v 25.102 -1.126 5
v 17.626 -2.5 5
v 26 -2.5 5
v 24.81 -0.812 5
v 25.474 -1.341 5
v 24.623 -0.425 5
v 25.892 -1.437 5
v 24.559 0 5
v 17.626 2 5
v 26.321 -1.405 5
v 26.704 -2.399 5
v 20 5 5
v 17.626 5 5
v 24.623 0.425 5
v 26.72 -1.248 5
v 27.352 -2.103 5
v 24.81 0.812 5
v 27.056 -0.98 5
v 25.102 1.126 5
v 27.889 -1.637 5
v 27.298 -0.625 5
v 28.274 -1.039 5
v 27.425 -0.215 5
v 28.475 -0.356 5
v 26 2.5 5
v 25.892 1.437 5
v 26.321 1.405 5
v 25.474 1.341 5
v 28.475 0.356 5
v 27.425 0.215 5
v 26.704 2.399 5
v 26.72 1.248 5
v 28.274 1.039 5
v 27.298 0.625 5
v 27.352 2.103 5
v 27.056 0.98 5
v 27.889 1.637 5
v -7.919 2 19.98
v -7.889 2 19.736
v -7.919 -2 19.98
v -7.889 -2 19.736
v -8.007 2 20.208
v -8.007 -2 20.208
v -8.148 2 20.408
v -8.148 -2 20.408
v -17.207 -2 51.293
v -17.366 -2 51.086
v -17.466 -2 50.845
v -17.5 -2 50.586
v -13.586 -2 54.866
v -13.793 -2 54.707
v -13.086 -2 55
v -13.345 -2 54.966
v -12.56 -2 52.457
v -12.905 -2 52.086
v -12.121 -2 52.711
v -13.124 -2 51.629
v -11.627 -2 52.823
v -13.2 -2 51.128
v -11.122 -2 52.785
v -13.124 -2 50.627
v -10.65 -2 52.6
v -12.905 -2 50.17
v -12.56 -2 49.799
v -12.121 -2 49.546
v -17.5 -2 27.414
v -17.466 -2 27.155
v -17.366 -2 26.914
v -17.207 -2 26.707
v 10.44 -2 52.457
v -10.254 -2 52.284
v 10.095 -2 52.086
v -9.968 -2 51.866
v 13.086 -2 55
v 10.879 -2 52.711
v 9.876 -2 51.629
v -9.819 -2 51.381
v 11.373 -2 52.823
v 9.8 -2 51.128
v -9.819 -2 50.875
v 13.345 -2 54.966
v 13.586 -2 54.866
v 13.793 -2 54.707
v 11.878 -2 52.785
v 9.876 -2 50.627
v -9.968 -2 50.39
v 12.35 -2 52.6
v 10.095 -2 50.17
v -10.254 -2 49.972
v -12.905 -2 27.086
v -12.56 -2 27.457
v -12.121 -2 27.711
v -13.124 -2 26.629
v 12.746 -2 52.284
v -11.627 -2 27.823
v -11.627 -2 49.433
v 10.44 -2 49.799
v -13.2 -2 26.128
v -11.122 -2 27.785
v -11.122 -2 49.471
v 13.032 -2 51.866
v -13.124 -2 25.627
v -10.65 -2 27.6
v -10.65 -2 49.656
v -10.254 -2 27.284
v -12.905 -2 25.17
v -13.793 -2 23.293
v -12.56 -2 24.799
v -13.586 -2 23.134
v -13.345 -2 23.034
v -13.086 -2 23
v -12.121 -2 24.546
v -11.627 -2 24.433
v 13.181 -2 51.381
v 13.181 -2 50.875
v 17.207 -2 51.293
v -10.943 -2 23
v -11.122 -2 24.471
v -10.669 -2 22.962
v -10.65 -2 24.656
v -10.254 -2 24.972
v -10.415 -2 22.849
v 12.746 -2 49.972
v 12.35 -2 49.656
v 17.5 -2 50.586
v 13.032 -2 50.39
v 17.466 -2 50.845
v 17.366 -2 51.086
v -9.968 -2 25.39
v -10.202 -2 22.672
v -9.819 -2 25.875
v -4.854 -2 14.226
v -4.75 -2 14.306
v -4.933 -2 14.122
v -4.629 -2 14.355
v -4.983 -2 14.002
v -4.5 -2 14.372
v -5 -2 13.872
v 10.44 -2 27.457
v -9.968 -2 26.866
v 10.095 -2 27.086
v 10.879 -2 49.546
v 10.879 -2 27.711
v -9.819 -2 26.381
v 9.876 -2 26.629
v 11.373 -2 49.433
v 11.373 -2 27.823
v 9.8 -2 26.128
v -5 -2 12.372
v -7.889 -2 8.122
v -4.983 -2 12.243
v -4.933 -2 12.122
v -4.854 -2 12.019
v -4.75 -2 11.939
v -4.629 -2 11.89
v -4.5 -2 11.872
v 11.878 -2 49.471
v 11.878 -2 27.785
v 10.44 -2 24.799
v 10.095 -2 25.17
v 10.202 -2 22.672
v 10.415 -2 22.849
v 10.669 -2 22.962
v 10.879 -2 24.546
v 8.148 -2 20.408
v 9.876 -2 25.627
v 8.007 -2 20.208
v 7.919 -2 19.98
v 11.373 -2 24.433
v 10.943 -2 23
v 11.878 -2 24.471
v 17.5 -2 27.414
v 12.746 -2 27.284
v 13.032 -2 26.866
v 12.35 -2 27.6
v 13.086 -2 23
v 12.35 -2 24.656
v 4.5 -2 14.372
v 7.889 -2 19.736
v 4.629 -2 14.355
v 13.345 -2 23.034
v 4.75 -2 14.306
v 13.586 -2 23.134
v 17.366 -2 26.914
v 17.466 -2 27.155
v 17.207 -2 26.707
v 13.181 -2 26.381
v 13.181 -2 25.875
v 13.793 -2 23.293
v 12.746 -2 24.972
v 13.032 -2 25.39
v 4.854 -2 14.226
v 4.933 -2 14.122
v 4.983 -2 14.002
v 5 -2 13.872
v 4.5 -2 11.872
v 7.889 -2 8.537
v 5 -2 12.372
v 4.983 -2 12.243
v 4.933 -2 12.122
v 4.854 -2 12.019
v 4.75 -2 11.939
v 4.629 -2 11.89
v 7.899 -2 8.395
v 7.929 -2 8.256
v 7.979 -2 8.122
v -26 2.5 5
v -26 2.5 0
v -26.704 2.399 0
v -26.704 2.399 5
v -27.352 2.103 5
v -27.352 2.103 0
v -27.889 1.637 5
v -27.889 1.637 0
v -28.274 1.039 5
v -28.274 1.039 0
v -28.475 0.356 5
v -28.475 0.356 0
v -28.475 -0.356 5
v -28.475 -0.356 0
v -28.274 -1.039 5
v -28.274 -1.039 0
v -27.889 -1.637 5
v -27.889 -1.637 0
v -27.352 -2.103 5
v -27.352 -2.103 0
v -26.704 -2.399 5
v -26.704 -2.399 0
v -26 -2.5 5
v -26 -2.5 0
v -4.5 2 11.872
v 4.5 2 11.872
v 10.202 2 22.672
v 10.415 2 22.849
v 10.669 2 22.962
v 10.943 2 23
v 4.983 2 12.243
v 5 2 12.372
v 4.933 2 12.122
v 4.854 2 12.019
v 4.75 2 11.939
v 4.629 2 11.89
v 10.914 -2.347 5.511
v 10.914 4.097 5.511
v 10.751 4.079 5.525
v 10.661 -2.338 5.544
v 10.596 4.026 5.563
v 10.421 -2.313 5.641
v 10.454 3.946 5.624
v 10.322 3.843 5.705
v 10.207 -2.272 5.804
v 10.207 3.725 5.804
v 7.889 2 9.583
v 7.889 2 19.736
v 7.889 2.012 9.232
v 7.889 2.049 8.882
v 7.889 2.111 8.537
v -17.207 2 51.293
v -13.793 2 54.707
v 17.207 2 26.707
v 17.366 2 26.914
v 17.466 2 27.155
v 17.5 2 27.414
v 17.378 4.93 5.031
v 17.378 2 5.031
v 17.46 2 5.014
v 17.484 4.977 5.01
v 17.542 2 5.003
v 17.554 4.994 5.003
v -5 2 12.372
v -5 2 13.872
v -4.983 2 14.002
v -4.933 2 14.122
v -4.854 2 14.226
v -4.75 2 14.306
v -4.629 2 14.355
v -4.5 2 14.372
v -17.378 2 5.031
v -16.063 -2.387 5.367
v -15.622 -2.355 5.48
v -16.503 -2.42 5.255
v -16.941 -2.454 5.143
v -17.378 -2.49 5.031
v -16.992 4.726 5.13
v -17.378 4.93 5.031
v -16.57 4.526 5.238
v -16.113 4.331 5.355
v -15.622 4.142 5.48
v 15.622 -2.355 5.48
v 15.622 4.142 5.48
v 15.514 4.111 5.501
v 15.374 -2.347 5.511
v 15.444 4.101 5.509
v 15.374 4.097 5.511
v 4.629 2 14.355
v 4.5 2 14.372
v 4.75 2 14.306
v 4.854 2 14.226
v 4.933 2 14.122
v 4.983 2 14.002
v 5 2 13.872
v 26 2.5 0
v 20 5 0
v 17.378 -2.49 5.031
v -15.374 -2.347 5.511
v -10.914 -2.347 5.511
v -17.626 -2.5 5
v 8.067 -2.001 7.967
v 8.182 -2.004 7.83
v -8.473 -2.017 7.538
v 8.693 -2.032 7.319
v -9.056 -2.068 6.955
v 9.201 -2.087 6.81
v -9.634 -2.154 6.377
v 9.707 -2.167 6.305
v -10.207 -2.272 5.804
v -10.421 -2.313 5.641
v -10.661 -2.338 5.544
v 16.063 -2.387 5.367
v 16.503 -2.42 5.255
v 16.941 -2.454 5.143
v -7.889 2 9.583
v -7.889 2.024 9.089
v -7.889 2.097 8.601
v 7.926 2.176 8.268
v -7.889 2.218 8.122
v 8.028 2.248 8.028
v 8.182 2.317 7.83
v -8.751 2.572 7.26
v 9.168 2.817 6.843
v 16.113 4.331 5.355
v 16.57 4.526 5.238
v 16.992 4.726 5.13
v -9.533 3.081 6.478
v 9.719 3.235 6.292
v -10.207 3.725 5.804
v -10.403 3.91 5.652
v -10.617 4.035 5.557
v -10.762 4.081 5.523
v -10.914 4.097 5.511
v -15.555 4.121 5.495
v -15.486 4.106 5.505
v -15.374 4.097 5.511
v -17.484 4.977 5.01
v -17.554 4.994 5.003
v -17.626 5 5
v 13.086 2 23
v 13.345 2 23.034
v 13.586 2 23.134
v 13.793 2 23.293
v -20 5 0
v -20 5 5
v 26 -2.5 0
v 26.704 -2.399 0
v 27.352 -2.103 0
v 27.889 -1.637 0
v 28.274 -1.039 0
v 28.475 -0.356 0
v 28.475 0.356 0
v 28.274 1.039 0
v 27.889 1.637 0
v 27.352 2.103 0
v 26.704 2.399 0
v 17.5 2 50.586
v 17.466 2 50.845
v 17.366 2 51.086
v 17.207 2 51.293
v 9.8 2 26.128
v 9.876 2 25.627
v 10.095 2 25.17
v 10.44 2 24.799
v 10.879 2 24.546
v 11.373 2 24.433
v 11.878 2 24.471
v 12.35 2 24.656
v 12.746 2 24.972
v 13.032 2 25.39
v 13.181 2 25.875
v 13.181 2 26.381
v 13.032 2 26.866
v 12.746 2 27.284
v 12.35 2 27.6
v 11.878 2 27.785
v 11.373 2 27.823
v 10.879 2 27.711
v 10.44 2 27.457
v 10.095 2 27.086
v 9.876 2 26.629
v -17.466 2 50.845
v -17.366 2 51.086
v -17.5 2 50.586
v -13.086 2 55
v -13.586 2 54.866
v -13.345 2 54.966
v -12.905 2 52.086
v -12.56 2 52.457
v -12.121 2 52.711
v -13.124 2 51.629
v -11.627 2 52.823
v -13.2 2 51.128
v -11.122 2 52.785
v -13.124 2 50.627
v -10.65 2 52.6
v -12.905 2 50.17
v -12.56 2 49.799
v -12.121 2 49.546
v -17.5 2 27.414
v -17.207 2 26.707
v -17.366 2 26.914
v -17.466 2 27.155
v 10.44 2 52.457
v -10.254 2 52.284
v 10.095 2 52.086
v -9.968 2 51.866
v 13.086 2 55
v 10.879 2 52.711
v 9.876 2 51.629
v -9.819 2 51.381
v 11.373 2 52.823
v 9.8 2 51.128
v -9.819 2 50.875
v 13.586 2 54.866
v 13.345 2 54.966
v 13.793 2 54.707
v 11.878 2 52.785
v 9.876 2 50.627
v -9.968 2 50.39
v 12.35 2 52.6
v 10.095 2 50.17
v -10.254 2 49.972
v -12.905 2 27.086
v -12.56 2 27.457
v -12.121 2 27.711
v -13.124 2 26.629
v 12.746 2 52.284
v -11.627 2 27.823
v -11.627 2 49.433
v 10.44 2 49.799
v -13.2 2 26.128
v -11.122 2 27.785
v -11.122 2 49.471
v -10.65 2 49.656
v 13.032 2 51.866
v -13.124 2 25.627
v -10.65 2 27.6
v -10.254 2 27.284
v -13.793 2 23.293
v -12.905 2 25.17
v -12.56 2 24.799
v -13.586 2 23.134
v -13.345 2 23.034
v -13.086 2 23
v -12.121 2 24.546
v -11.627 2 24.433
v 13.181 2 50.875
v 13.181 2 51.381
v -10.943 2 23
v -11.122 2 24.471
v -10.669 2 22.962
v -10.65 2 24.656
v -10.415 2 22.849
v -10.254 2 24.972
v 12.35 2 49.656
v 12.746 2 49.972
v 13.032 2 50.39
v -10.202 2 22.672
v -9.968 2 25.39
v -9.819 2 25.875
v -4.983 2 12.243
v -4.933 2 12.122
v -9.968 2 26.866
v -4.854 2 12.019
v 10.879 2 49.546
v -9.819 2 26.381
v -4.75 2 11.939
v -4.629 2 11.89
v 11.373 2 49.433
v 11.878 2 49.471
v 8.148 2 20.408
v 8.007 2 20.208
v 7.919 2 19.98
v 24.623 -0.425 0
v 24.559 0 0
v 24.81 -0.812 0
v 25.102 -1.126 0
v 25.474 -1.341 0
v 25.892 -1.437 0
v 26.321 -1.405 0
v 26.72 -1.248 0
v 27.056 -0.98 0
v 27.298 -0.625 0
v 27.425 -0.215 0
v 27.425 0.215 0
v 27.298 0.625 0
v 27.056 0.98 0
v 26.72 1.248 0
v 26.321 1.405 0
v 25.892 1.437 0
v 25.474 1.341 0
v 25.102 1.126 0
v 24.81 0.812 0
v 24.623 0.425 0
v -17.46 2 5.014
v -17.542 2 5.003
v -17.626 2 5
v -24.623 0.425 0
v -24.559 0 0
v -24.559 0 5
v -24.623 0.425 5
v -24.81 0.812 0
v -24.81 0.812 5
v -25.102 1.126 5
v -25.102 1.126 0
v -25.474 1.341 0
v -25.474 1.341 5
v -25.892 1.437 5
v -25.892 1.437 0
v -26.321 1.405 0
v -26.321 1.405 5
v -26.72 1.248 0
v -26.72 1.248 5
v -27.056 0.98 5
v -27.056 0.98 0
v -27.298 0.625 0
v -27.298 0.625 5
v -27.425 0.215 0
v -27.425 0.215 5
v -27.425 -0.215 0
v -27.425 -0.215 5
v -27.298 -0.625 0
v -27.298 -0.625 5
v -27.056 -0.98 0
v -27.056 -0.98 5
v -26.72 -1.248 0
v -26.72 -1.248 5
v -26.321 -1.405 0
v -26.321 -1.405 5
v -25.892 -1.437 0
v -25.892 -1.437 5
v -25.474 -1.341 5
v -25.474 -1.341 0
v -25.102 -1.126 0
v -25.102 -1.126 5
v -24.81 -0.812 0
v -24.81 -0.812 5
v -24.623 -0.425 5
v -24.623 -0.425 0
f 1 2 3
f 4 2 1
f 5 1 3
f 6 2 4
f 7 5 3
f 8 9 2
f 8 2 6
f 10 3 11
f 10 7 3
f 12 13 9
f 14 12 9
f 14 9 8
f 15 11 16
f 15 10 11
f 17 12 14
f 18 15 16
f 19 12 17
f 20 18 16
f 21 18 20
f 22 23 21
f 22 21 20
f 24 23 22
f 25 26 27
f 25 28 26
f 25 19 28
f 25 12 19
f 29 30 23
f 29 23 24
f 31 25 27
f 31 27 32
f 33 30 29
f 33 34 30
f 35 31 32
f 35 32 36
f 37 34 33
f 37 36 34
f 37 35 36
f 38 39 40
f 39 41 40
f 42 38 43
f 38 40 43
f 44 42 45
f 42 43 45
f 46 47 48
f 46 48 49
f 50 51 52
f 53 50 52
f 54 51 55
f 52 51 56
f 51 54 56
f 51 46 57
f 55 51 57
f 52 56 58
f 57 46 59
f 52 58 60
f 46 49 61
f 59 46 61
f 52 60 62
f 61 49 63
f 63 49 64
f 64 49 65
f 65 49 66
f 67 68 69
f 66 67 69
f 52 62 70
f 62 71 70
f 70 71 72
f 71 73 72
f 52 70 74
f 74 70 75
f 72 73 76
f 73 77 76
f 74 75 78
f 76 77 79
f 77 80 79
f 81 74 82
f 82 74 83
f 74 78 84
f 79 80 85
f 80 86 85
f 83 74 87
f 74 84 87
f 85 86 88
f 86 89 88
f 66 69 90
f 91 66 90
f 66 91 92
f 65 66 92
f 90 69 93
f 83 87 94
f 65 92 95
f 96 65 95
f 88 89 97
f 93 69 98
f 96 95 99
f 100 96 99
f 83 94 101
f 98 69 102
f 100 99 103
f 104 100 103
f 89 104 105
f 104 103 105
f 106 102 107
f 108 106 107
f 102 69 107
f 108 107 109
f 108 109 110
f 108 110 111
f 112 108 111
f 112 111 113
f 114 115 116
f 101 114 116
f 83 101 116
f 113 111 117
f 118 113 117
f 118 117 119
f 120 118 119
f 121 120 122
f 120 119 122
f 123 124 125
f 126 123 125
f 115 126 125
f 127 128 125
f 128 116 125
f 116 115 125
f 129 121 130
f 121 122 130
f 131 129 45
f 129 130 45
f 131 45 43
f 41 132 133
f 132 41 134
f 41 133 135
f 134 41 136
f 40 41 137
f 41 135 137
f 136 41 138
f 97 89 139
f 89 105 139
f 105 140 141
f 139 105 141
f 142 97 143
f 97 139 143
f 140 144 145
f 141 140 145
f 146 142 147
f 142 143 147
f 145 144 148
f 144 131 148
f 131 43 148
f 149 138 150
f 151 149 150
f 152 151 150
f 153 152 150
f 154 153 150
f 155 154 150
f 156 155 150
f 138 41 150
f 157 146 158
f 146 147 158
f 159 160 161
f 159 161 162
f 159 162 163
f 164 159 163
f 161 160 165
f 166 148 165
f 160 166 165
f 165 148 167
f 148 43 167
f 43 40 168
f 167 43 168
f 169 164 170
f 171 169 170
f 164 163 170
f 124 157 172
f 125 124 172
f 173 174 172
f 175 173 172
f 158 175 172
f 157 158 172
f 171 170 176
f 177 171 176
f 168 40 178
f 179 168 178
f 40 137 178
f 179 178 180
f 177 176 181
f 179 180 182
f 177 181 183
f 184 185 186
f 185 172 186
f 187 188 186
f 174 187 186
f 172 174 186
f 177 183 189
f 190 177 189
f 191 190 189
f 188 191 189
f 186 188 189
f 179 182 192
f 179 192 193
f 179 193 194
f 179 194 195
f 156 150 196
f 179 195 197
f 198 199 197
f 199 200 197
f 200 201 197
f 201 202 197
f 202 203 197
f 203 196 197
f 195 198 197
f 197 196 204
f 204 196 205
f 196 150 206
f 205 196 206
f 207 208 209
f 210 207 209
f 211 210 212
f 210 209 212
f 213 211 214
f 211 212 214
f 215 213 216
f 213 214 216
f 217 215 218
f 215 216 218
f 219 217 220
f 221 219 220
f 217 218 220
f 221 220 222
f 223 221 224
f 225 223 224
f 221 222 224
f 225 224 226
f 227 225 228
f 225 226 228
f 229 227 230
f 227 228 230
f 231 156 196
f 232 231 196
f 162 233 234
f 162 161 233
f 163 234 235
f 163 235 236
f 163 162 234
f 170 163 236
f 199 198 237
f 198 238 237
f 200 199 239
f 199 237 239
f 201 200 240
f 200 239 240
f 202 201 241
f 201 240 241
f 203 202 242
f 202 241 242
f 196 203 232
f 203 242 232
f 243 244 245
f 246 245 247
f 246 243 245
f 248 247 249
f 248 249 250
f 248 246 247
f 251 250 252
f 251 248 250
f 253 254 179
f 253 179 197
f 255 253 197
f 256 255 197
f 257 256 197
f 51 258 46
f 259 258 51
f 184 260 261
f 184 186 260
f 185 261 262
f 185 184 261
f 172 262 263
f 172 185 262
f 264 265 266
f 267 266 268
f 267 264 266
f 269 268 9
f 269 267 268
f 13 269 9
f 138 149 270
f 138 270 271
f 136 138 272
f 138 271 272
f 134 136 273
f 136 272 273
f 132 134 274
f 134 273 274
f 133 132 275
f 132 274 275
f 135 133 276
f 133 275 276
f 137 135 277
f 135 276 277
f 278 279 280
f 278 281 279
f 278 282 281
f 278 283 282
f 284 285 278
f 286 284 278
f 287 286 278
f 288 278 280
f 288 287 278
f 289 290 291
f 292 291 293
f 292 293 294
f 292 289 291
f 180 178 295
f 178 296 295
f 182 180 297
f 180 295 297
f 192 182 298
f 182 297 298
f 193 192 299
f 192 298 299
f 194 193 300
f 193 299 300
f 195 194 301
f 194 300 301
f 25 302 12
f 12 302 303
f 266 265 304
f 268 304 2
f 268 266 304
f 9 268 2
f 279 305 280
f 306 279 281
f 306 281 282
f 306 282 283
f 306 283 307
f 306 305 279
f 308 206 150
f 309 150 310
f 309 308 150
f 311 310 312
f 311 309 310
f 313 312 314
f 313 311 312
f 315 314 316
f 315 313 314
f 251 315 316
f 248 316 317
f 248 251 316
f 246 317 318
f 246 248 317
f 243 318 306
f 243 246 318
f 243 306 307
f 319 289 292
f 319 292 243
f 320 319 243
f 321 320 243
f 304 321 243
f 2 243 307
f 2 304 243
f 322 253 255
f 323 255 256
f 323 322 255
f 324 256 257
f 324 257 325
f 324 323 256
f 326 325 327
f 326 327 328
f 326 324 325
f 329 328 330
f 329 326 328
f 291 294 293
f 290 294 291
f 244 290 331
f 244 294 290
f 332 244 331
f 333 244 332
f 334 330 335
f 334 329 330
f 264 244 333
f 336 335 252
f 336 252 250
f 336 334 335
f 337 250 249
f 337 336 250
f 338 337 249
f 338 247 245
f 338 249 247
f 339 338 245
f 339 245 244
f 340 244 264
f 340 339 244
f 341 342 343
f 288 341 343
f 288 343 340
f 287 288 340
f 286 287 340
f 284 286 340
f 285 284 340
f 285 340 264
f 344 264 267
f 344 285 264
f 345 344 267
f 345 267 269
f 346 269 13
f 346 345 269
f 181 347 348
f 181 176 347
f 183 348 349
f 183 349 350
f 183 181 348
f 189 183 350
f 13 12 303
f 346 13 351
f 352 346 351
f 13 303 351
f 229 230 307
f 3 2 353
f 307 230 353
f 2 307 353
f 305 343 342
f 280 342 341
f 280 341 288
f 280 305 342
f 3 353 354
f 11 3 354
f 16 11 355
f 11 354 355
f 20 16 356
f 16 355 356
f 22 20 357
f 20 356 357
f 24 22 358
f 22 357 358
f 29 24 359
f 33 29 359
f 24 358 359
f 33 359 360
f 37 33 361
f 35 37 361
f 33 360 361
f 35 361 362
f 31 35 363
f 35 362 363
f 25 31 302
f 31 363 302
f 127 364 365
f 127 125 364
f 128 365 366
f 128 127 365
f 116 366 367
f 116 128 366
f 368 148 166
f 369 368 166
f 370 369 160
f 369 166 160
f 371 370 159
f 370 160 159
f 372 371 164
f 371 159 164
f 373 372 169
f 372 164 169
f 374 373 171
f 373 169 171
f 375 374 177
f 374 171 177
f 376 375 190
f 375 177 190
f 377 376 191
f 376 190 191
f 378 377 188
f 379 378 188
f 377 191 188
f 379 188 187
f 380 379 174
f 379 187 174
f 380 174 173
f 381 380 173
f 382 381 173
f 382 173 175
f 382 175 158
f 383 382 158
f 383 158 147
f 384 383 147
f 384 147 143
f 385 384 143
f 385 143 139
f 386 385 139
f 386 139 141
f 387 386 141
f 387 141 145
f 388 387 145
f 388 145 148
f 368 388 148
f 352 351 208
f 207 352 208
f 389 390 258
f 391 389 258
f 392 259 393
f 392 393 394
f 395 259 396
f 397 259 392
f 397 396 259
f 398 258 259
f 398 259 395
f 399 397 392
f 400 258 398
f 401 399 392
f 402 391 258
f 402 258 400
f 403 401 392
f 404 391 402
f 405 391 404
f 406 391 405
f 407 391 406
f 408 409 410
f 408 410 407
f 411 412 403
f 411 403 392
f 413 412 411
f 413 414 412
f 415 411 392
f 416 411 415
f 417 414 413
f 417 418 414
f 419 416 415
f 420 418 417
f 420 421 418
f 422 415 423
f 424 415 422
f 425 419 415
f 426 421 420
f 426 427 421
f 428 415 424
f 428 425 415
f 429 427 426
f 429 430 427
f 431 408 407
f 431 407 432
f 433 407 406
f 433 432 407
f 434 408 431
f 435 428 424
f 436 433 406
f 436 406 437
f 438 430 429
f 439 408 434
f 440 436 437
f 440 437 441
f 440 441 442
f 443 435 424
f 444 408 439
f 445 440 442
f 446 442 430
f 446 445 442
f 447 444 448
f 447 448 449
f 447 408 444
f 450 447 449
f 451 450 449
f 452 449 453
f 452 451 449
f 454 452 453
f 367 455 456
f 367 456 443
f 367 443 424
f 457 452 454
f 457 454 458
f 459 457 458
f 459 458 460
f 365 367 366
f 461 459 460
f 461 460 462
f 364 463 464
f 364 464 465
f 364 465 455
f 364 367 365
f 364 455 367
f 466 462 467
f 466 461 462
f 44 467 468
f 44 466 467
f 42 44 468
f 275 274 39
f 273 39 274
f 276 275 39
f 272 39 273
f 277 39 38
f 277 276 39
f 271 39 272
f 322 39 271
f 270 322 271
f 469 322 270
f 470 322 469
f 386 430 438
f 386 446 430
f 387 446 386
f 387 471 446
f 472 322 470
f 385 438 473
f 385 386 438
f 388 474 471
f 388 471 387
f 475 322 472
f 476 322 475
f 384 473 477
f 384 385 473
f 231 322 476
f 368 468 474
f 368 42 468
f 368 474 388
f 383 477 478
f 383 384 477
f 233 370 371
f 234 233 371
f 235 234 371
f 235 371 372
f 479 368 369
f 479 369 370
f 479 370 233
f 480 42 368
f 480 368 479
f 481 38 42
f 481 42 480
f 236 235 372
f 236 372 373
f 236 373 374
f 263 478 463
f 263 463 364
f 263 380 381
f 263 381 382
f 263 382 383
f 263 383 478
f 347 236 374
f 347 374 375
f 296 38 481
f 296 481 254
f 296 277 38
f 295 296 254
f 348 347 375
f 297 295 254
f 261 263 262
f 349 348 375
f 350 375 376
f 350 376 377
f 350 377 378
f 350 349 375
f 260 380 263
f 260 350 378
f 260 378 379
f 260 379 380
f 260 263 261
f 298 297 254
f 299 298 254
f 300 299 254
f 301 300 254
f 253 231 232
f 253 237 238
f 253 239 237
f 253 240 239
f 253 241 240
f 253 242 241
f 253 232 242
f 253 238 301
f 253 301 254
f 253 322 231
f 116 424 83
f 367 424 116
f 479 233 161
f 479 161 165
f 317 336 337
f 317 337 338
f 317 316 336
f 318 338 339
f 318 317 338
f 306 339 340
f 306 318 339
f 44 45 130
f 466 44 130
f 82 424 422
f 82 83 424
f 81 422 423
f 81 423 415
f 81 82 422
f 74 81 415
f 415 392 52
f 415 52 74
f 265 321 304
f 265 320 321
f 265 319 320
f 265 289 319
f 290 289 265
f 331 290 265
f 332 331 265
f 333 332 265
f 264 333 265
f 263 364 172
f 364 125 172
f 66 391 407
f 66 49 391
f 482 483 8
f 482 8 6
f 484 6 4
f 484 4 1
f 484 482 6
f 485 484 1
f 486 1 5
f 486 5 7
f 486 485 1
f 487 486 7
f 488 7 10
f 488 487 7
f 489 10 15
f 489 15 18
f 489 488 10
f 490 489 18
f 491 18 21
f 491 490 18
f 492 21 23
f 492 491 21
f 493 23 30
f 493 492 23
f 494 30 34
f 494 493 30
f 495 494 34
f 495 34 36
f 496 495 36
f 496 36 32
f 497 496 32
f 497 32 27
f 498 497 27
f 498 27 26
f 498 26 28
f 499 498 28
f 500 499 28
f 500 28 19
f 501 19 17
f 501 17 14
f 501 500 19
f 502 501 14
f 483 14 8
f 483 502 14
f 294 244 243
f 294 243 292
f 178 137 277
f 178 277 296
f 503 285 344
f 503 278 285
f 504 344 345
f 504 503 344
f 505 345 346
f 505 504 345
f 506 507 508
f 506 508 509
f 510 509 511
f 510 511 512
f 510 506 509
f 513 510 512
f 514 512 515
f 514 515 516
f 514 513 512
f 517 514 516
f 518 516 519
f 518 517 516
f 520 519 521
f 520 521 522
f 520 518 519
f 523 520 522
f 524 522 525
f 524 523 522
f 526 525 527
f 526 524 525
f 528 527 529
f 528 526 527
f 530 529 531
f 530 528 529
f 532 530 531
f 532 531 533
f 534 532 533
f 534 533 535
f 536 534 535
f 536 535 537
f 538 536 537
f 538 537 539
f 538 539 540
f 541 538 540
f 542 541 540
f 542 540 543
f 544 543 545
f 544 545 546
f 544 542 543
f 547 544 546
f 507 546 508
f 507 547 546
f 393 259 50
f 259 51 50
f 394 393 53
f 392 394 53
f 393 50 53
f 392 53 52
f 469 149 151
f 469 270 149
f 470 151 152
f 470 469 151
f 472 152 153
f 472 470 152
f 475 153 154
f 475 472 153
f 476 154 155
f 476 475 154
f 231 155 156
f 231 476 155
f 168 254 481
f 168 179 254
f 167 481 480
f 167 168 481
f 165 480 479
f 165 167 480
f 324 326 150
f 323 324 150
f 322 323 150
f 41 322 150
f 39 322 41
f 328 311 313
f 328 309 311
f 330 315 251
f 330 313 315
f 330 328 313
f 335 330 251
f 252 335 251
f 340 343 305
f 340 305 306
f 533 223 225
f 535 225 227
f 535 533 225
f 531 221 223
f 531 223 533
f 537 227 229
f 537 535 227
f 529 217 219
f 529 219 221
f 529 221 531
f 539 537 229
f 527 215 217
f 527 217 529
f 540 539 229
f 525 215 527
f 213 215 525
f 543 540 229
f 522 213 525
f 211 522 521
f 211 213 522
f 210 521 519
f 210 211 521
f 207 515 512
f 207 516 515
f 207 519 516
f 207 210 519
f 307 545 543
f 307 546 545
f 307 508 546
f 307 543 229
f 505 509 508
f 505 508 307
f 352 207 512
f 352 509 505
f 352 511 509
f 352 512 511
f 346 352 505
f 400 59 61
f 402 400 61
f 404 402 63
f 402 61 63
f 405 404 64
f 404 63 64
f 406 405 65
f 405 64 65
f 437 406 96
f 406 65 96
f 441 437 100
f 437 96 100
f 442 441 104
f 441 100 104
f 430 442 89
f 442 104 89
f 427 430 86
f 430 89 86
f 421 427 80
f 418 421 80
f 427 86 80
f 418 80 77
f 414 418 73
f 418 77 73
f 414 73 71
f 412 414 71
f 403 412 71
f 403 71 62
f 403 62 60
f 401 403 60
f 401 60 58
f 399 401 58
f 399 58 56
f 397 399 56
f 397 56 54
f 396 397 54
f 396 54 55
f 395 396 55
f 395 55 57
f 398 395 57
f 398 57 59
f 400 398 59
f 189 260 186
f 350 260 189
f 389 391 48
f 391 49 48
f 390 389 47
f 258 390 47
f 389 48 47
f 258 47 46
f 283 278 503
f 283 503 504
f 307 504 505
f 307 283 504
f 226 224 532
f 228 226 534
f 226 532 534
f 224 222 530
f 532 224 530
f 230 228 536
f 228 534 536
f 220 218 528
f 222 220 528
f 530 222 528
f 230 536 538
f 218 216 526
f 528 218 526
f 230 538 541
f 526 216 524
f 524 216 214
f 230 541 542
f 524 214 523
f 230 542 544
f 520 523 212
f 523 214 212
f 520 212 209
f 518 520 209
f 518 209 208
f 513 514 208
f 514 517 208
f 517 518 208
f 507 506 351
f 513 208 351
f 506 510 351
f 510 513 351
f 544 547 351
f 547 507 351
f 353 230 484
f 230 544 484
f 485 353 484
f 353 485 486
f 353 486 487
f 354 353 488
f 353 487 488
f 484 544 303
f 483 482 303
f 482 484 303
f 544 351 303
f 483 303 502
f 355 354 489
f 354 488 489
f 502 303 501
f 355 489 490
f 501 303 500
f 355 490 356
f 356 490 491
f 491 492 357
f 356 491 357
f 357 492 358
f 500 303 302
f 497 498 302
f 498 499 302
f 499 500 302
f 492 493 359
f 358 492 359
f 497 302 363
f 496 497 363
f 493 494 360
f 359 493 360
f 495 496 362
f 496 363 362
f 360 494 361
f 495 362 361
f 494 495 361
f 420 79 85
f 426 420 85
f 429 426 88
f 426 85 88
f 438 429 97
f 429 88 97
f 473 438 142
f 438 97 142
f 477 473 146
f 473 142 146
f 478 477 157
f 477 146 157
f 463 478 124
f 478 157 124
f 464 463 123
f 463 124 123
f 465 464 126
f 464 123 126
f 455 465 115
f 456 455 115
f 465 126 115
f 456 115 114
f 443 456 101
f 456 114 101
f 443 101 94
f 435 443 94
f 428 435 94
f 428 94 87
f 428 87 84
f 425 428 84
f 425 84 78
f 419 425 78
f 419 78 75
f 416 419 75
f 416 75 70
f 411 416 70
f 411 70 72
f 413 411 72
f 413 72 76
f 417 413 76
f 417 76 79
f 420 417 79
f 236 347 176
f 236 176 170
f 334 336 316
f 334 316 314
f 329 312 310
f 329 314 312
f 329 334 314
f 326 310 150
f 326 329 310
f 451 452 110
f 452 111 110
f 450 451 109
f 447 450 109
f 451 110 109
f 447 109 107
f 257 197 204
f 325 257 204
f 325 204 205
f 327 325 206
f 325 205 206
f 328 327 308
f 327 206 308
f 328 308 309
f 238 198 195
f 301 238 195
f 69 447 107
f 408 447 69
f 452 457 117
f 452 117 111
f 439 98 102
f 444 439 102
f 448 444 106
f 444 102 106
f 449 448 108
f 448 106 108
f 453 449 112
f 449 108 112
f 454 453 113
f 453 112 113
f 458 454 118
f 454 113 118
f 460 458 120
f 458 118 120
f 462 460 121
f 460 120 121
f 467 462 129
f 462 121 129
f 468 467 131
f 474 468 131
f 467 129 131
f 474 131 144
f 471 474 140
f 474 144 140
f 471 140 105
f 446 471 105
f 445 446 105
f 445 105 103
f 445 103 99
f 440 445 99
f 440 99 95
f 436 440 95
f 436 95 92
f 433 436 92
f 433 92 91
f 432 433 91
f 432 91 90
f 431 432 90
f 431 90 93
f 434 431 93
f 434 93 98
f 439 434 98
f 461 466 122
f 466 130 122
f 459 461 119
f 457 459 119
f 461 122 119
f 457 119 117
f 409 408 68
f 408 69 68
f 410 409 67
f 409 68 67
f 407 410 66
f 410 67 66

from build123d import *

# Parameters (mm, degrees)
SKETCH_1_R                      = 1.440775231
EXTRUDE_1_DEPTH                 = 5
SKETCH_3_W                      = 35
SKETCH_3_H                      = 4
EXTRUDE_2_DEPTH                 = 50
FILLET_1_R                      = 10
FILLET_2_R                      = 5
CUT_EXTRUDE_2_DEPTH             = 63.339794674
CUT_EXTRUDE_2_DEPTH_BACK        = 63.339794674
CUT_EXTRUDE_3_REACH             = 64.34
SKETCH_5_R                      = 1.7
SKETCH_5_W                      = 10
SKETCH_5_H                      = 2.5
CUT_EXTRUDE_3_DIRECTION_2_DEPTH = 63.339794674
FILLET_3_R                      = 0.5
FILLET_4_R                      = 1


with BuildPart() as part:
    # 草图1 → 凸台-拉伸1 (new body)
    with BuildSketch(Plane.XY):
        with BuildLine():
            Line((-26, -2.5), (26, -2.5))
            ThreePointArc((26, -2.5), (28.5, 0), (26, 2.5))
            Line((26, 2.5), (20, 5))
            Line((20, 5), (-20, 5))
            Line((-20, 5), (-26, 2.5))
            ThreePointArc((-26, 2.5), (-28.5, 0), (-26, -2.5))
        make_face()
        with Locations((-26, 0)):
            Circle(SKETCH_1_R, mode=Mode.SUBTRACT)
        with Locations(Location((26, 0, 0), (0, 0, 180))):
            Circle(SKETCH_1_R, mode=Mode.SUBTRACT)
    extrude(amount=EXTRUDE_1_DEPTH)

    # 草图3 → 凸台-拉伸2 (add)
    with BuildSketch(Plane.XY.offset(5)):
        Rectangle(SKETCH_3_W, SKETCH_3_H)
    extrude(amount=EXTRUDE_2_DEPTH)

    # 圆角1
    # the kernel refuses this fillet: 10 mm, written as the material it adds along each edge
    with BuildSketch(Plane(origin=(17.5, -2, 5), x_dir=(0, -1.0, 2.1849189124477904e-12), z_dir=(-1, 0, 0))) as fillet_1_piece_1:
        with BuildLine():
            CenterArc((10, 3.122498999), FILLET_1_R, 180, 18.194872339)
            Line((0, 3.122498999), (-0.2, 3.122498999))
            Line((-0.2, 3.122498999), (-0.2, 0))
            Line((-0.2, 0), (0, -0.2))
            ThreePointArc((0, -0.2), (0.25, -0.2), (0.31, -0.06244998))
            Line((0.31, -0.06244998), (0.5, 0))
        make_face()
    extrude(amount=35)

    # 圆角2
    # the kernel refuses this fillet: 5 mm, written as the material it adds along each edge
    with BuildSketch(Plane(origin=(-17.5, 2, 5), x_dir=(0, 0, 1), z_dir=(1, 0, 0))) as fillet_2_piece_1:
        with BuildLine():
            CenterArc((4.582575695, -5), FILLET_2_R, 90, 66.421821522)
            Line((0, -3), (-0.091651514, -2.96))
            ThreePointArc((-0.091651514, -2.96), (-0.1, -1.5), (-0.1, 0))
            Line((-0.1, 0), (0, 0.1))
            Line((0, 0.1), (4.582575695, 0.1))
            Line((4.582575695, 0.1), (4.582575695, 0))
        make_face()
    extrude(amount=35)

    # 草图4 → 切除-拉伸2 (cut, two sides: drawn at the far end of the back side and taken through both)
    with BuildSketch(Plane.XZ.offset(2).offset(-CUT_EXTRUDE_2_DEPTH_BACK)):
        Polygon((-17.5, 51), (-13.5, 55), (-17.5, 55), align=None)
        Polygon((-13.5, 23), (-17.5, 27), (-17.5, 5), (-15.5, 5.511275368), (-10.5, 5.511275368), (-7.888776369, 8.122498999), (-7.888776369, 20.122498999), (-10.5, 23), align=None)
        Polygon((17.5, 5), (17.5, 27), (13.5, 23), (10.5, 23), (7.888776369, 20.122498999), (7.888776369, 8.122498999), (10.5, 5.511275368), (15.5, 5.511275368), align=None)
        Polygon((17.5, 51), (17.5, 55), (13.5, 55), align=None)
    extrude(amount=CUT_EXTRUDE_2_DEPTH + CUT_EXTRUDE_2_DEPTH_BACK, mode=Mode.SUBTRACT)

    # 草图5 → 切除-拉伸3 (cut, up to next)
    with BuildSketch(Plane.XZ.offset(2), mode=Mode.PRIVATE) as cut_extrude_3_sk1:
        with Locations(Location((-11.5, 26.128065597, 0), (0, 0, 180))):
            Circle(SKETCH_5_R)
    cut_extrude_3_tool1 = extrude(cut_extrude_3_sk1.sketch, amount=-CUT_EXTRUDE_3_REACH, mode=Mode.PRIVATE) & part.part
    # 草图5 → 切除-拉伸3 (cut, up to next)
    with BuildSketch(Plane.XZ.offset(2), mode=Mode.PRIVATE) as cut_extrude_3_sk2:
        with Locations(Location((11.5, 26.128065597, 0), (0, 0, 180))):
            Circle(SKETCH_5_R)
    cut_extrude_3_tool2 = extrude(cut_extrude_3_sk2.sketch, amount=-CUT_EXTRUDE_3_REACH, mode=Mode.PRIVATE) & part.part
    # 草图5 → 切除-拉伸3 (cut, up to next)
    with BuildSketch(Plane.XZ.offset(2), mode=Mode.PRIVATE) as cut_extrude_3_sk3:
        with Locations(Location((11.5, 51.128065597, 0), (0, 0, 180))):
            Circle(SKETCH_5_R)
    cut_extrude_3_tool3 = extrude(cut_extrude_3_sk3.sketch, amount=-CUT_EXTRUDE_3_REACH, mode=Mode.PRIVATE) & part.part
    # 草图5 → 切除-拉伸3 (cut, up to next)
    with BuildSketch(Plane.XZ.offset(2), mode=Mode.PRIVATE) as cut_extrude_3_sk4:
        with Locations(Location((-11.5, 51.128065597, 0), (0, 0, 180))):
            Circle(SKETCH_5_R)
    cut_extrude_3_tool4 = extrude(cut_extrude_3_sk4.sketch, amount=-CUT_EXTRUDE_3_REACH, mode=Mode.PRIVATE) & part.part
    # 草图5 → 切除-拉伸3 (cut, up to next)
    with BuildSketch(Plane.XZ.offset(2), mode=Mode.PRIVATE) as cut_extrude_3_sk5:
        with Locations((0, 13.122498999)):
            Rectangle(SKETCH_5_W, SKETCH_5_H)
    cut_extrude_3_tool5 = extrude(cut_extrude_3_sk5.sketch, amount=-CUT_EXTRUDE_3_REACH, mode=Mode.PRIVATE) & part.part
    add(cut_extrude_3_tool1.solids().sort_by_distance((-11.5, -2, 26.128066))[0], mode=Mode.SUBTRACT)
    add(cut_extrude_3_tool2.solids().sort_by_distance((11.5, -2, 26.128066))[0], mode=Mode.SUBTRACT)
    add(cut_extrude_3_tool3.solids().sort_by_distance((11.5, -2, 51.128066))[0], mode=Mode.SUBTRACT)
    add(cut_extrude_3_tool4.solids().sort_by_distance((-11.5, -2, 51.128066))[0], mode=Mode.SUBTRACT)
    add(cut_extrude_3_tool5.solids().sort_by_distance((0, -2, 13.122499))[0], mode=Mode.SUBTRACT)

    # 草图5 → 切除-拉伸3 direction 2 (cut)
    with BuildSketch(Plane.XZ.offset(2)):
        with Locations(Location((-11.5, 26.128065597, 0), (0, 0, 180))):
            Circle(SKETCH_5_R)
        with Locations(Location((11.5, 26.128065597, 0), (0, 0, 180))):
            Circle(SKETCH_5_R)
        with Locations(Location((11.5, 51.128065597, 0), (0, 0, 180))):
            Circle(SKETCH_5_R)
        with Locations(Location((-11.5, 51.128065597, 0), (0, 0, 180))):
            Circle(SKETCH_5_R)
        with Locations((0, 13.122498999)):
            Rectangle(SKETCH_5_W, SKETCH_5_H)
    extrude(amount=CUT_EXTRUDE_3_DIRECTION_2_DEPTH, mode=Mode.SUBTRACT)

    # 圆角3
    fillet_3_edges = [part.edges().sort_by_distance(p)[0] for p in [
        (5, 0, 11.872498999),
        (5, 0, 14.372498999),
        (-5, 0, 14.372498999),
        (-5, 0, 11.872498999),
    ]]
    fillet(fillet_3_edges, radius=FILLET_3_R)

    # 圆角4
    fillet_4_edges = [part.edges().sort_by_distance(p)[0] for p in [
        (17.5, 0, 51),
        (13.5, 0, 55),
        (17.5, 0, 27),
        (13.5, 0, 23),
        (10.5, 0, 23),
        (7.888776369, 0, 20.122498999),
        (7.888776369, 0.108965912, 8.122498999),
        (10.5, 0.875277907, 5.511275368),
        (15.5, 0.875277907, 5.511275368),
        (17.5, 1.25, 5),
        (-17.5, 1.25, 5),
        (-15.5, 0.875277907, 5.511275368),
        (-10.5, 0.875277907, 5.511275368),
        (-7.888776369, 0, 20.122498999),
        (-10.5, 0, 23),
        (-13.5, 0, 23),
        (-17.5, 0, 27),
        (-17.5, 0, 51),
        (-13.5, 0, 55),
    ]]
    fillet(fillet_4_edges, radius=FILLET_4_R)


solid = part.part
